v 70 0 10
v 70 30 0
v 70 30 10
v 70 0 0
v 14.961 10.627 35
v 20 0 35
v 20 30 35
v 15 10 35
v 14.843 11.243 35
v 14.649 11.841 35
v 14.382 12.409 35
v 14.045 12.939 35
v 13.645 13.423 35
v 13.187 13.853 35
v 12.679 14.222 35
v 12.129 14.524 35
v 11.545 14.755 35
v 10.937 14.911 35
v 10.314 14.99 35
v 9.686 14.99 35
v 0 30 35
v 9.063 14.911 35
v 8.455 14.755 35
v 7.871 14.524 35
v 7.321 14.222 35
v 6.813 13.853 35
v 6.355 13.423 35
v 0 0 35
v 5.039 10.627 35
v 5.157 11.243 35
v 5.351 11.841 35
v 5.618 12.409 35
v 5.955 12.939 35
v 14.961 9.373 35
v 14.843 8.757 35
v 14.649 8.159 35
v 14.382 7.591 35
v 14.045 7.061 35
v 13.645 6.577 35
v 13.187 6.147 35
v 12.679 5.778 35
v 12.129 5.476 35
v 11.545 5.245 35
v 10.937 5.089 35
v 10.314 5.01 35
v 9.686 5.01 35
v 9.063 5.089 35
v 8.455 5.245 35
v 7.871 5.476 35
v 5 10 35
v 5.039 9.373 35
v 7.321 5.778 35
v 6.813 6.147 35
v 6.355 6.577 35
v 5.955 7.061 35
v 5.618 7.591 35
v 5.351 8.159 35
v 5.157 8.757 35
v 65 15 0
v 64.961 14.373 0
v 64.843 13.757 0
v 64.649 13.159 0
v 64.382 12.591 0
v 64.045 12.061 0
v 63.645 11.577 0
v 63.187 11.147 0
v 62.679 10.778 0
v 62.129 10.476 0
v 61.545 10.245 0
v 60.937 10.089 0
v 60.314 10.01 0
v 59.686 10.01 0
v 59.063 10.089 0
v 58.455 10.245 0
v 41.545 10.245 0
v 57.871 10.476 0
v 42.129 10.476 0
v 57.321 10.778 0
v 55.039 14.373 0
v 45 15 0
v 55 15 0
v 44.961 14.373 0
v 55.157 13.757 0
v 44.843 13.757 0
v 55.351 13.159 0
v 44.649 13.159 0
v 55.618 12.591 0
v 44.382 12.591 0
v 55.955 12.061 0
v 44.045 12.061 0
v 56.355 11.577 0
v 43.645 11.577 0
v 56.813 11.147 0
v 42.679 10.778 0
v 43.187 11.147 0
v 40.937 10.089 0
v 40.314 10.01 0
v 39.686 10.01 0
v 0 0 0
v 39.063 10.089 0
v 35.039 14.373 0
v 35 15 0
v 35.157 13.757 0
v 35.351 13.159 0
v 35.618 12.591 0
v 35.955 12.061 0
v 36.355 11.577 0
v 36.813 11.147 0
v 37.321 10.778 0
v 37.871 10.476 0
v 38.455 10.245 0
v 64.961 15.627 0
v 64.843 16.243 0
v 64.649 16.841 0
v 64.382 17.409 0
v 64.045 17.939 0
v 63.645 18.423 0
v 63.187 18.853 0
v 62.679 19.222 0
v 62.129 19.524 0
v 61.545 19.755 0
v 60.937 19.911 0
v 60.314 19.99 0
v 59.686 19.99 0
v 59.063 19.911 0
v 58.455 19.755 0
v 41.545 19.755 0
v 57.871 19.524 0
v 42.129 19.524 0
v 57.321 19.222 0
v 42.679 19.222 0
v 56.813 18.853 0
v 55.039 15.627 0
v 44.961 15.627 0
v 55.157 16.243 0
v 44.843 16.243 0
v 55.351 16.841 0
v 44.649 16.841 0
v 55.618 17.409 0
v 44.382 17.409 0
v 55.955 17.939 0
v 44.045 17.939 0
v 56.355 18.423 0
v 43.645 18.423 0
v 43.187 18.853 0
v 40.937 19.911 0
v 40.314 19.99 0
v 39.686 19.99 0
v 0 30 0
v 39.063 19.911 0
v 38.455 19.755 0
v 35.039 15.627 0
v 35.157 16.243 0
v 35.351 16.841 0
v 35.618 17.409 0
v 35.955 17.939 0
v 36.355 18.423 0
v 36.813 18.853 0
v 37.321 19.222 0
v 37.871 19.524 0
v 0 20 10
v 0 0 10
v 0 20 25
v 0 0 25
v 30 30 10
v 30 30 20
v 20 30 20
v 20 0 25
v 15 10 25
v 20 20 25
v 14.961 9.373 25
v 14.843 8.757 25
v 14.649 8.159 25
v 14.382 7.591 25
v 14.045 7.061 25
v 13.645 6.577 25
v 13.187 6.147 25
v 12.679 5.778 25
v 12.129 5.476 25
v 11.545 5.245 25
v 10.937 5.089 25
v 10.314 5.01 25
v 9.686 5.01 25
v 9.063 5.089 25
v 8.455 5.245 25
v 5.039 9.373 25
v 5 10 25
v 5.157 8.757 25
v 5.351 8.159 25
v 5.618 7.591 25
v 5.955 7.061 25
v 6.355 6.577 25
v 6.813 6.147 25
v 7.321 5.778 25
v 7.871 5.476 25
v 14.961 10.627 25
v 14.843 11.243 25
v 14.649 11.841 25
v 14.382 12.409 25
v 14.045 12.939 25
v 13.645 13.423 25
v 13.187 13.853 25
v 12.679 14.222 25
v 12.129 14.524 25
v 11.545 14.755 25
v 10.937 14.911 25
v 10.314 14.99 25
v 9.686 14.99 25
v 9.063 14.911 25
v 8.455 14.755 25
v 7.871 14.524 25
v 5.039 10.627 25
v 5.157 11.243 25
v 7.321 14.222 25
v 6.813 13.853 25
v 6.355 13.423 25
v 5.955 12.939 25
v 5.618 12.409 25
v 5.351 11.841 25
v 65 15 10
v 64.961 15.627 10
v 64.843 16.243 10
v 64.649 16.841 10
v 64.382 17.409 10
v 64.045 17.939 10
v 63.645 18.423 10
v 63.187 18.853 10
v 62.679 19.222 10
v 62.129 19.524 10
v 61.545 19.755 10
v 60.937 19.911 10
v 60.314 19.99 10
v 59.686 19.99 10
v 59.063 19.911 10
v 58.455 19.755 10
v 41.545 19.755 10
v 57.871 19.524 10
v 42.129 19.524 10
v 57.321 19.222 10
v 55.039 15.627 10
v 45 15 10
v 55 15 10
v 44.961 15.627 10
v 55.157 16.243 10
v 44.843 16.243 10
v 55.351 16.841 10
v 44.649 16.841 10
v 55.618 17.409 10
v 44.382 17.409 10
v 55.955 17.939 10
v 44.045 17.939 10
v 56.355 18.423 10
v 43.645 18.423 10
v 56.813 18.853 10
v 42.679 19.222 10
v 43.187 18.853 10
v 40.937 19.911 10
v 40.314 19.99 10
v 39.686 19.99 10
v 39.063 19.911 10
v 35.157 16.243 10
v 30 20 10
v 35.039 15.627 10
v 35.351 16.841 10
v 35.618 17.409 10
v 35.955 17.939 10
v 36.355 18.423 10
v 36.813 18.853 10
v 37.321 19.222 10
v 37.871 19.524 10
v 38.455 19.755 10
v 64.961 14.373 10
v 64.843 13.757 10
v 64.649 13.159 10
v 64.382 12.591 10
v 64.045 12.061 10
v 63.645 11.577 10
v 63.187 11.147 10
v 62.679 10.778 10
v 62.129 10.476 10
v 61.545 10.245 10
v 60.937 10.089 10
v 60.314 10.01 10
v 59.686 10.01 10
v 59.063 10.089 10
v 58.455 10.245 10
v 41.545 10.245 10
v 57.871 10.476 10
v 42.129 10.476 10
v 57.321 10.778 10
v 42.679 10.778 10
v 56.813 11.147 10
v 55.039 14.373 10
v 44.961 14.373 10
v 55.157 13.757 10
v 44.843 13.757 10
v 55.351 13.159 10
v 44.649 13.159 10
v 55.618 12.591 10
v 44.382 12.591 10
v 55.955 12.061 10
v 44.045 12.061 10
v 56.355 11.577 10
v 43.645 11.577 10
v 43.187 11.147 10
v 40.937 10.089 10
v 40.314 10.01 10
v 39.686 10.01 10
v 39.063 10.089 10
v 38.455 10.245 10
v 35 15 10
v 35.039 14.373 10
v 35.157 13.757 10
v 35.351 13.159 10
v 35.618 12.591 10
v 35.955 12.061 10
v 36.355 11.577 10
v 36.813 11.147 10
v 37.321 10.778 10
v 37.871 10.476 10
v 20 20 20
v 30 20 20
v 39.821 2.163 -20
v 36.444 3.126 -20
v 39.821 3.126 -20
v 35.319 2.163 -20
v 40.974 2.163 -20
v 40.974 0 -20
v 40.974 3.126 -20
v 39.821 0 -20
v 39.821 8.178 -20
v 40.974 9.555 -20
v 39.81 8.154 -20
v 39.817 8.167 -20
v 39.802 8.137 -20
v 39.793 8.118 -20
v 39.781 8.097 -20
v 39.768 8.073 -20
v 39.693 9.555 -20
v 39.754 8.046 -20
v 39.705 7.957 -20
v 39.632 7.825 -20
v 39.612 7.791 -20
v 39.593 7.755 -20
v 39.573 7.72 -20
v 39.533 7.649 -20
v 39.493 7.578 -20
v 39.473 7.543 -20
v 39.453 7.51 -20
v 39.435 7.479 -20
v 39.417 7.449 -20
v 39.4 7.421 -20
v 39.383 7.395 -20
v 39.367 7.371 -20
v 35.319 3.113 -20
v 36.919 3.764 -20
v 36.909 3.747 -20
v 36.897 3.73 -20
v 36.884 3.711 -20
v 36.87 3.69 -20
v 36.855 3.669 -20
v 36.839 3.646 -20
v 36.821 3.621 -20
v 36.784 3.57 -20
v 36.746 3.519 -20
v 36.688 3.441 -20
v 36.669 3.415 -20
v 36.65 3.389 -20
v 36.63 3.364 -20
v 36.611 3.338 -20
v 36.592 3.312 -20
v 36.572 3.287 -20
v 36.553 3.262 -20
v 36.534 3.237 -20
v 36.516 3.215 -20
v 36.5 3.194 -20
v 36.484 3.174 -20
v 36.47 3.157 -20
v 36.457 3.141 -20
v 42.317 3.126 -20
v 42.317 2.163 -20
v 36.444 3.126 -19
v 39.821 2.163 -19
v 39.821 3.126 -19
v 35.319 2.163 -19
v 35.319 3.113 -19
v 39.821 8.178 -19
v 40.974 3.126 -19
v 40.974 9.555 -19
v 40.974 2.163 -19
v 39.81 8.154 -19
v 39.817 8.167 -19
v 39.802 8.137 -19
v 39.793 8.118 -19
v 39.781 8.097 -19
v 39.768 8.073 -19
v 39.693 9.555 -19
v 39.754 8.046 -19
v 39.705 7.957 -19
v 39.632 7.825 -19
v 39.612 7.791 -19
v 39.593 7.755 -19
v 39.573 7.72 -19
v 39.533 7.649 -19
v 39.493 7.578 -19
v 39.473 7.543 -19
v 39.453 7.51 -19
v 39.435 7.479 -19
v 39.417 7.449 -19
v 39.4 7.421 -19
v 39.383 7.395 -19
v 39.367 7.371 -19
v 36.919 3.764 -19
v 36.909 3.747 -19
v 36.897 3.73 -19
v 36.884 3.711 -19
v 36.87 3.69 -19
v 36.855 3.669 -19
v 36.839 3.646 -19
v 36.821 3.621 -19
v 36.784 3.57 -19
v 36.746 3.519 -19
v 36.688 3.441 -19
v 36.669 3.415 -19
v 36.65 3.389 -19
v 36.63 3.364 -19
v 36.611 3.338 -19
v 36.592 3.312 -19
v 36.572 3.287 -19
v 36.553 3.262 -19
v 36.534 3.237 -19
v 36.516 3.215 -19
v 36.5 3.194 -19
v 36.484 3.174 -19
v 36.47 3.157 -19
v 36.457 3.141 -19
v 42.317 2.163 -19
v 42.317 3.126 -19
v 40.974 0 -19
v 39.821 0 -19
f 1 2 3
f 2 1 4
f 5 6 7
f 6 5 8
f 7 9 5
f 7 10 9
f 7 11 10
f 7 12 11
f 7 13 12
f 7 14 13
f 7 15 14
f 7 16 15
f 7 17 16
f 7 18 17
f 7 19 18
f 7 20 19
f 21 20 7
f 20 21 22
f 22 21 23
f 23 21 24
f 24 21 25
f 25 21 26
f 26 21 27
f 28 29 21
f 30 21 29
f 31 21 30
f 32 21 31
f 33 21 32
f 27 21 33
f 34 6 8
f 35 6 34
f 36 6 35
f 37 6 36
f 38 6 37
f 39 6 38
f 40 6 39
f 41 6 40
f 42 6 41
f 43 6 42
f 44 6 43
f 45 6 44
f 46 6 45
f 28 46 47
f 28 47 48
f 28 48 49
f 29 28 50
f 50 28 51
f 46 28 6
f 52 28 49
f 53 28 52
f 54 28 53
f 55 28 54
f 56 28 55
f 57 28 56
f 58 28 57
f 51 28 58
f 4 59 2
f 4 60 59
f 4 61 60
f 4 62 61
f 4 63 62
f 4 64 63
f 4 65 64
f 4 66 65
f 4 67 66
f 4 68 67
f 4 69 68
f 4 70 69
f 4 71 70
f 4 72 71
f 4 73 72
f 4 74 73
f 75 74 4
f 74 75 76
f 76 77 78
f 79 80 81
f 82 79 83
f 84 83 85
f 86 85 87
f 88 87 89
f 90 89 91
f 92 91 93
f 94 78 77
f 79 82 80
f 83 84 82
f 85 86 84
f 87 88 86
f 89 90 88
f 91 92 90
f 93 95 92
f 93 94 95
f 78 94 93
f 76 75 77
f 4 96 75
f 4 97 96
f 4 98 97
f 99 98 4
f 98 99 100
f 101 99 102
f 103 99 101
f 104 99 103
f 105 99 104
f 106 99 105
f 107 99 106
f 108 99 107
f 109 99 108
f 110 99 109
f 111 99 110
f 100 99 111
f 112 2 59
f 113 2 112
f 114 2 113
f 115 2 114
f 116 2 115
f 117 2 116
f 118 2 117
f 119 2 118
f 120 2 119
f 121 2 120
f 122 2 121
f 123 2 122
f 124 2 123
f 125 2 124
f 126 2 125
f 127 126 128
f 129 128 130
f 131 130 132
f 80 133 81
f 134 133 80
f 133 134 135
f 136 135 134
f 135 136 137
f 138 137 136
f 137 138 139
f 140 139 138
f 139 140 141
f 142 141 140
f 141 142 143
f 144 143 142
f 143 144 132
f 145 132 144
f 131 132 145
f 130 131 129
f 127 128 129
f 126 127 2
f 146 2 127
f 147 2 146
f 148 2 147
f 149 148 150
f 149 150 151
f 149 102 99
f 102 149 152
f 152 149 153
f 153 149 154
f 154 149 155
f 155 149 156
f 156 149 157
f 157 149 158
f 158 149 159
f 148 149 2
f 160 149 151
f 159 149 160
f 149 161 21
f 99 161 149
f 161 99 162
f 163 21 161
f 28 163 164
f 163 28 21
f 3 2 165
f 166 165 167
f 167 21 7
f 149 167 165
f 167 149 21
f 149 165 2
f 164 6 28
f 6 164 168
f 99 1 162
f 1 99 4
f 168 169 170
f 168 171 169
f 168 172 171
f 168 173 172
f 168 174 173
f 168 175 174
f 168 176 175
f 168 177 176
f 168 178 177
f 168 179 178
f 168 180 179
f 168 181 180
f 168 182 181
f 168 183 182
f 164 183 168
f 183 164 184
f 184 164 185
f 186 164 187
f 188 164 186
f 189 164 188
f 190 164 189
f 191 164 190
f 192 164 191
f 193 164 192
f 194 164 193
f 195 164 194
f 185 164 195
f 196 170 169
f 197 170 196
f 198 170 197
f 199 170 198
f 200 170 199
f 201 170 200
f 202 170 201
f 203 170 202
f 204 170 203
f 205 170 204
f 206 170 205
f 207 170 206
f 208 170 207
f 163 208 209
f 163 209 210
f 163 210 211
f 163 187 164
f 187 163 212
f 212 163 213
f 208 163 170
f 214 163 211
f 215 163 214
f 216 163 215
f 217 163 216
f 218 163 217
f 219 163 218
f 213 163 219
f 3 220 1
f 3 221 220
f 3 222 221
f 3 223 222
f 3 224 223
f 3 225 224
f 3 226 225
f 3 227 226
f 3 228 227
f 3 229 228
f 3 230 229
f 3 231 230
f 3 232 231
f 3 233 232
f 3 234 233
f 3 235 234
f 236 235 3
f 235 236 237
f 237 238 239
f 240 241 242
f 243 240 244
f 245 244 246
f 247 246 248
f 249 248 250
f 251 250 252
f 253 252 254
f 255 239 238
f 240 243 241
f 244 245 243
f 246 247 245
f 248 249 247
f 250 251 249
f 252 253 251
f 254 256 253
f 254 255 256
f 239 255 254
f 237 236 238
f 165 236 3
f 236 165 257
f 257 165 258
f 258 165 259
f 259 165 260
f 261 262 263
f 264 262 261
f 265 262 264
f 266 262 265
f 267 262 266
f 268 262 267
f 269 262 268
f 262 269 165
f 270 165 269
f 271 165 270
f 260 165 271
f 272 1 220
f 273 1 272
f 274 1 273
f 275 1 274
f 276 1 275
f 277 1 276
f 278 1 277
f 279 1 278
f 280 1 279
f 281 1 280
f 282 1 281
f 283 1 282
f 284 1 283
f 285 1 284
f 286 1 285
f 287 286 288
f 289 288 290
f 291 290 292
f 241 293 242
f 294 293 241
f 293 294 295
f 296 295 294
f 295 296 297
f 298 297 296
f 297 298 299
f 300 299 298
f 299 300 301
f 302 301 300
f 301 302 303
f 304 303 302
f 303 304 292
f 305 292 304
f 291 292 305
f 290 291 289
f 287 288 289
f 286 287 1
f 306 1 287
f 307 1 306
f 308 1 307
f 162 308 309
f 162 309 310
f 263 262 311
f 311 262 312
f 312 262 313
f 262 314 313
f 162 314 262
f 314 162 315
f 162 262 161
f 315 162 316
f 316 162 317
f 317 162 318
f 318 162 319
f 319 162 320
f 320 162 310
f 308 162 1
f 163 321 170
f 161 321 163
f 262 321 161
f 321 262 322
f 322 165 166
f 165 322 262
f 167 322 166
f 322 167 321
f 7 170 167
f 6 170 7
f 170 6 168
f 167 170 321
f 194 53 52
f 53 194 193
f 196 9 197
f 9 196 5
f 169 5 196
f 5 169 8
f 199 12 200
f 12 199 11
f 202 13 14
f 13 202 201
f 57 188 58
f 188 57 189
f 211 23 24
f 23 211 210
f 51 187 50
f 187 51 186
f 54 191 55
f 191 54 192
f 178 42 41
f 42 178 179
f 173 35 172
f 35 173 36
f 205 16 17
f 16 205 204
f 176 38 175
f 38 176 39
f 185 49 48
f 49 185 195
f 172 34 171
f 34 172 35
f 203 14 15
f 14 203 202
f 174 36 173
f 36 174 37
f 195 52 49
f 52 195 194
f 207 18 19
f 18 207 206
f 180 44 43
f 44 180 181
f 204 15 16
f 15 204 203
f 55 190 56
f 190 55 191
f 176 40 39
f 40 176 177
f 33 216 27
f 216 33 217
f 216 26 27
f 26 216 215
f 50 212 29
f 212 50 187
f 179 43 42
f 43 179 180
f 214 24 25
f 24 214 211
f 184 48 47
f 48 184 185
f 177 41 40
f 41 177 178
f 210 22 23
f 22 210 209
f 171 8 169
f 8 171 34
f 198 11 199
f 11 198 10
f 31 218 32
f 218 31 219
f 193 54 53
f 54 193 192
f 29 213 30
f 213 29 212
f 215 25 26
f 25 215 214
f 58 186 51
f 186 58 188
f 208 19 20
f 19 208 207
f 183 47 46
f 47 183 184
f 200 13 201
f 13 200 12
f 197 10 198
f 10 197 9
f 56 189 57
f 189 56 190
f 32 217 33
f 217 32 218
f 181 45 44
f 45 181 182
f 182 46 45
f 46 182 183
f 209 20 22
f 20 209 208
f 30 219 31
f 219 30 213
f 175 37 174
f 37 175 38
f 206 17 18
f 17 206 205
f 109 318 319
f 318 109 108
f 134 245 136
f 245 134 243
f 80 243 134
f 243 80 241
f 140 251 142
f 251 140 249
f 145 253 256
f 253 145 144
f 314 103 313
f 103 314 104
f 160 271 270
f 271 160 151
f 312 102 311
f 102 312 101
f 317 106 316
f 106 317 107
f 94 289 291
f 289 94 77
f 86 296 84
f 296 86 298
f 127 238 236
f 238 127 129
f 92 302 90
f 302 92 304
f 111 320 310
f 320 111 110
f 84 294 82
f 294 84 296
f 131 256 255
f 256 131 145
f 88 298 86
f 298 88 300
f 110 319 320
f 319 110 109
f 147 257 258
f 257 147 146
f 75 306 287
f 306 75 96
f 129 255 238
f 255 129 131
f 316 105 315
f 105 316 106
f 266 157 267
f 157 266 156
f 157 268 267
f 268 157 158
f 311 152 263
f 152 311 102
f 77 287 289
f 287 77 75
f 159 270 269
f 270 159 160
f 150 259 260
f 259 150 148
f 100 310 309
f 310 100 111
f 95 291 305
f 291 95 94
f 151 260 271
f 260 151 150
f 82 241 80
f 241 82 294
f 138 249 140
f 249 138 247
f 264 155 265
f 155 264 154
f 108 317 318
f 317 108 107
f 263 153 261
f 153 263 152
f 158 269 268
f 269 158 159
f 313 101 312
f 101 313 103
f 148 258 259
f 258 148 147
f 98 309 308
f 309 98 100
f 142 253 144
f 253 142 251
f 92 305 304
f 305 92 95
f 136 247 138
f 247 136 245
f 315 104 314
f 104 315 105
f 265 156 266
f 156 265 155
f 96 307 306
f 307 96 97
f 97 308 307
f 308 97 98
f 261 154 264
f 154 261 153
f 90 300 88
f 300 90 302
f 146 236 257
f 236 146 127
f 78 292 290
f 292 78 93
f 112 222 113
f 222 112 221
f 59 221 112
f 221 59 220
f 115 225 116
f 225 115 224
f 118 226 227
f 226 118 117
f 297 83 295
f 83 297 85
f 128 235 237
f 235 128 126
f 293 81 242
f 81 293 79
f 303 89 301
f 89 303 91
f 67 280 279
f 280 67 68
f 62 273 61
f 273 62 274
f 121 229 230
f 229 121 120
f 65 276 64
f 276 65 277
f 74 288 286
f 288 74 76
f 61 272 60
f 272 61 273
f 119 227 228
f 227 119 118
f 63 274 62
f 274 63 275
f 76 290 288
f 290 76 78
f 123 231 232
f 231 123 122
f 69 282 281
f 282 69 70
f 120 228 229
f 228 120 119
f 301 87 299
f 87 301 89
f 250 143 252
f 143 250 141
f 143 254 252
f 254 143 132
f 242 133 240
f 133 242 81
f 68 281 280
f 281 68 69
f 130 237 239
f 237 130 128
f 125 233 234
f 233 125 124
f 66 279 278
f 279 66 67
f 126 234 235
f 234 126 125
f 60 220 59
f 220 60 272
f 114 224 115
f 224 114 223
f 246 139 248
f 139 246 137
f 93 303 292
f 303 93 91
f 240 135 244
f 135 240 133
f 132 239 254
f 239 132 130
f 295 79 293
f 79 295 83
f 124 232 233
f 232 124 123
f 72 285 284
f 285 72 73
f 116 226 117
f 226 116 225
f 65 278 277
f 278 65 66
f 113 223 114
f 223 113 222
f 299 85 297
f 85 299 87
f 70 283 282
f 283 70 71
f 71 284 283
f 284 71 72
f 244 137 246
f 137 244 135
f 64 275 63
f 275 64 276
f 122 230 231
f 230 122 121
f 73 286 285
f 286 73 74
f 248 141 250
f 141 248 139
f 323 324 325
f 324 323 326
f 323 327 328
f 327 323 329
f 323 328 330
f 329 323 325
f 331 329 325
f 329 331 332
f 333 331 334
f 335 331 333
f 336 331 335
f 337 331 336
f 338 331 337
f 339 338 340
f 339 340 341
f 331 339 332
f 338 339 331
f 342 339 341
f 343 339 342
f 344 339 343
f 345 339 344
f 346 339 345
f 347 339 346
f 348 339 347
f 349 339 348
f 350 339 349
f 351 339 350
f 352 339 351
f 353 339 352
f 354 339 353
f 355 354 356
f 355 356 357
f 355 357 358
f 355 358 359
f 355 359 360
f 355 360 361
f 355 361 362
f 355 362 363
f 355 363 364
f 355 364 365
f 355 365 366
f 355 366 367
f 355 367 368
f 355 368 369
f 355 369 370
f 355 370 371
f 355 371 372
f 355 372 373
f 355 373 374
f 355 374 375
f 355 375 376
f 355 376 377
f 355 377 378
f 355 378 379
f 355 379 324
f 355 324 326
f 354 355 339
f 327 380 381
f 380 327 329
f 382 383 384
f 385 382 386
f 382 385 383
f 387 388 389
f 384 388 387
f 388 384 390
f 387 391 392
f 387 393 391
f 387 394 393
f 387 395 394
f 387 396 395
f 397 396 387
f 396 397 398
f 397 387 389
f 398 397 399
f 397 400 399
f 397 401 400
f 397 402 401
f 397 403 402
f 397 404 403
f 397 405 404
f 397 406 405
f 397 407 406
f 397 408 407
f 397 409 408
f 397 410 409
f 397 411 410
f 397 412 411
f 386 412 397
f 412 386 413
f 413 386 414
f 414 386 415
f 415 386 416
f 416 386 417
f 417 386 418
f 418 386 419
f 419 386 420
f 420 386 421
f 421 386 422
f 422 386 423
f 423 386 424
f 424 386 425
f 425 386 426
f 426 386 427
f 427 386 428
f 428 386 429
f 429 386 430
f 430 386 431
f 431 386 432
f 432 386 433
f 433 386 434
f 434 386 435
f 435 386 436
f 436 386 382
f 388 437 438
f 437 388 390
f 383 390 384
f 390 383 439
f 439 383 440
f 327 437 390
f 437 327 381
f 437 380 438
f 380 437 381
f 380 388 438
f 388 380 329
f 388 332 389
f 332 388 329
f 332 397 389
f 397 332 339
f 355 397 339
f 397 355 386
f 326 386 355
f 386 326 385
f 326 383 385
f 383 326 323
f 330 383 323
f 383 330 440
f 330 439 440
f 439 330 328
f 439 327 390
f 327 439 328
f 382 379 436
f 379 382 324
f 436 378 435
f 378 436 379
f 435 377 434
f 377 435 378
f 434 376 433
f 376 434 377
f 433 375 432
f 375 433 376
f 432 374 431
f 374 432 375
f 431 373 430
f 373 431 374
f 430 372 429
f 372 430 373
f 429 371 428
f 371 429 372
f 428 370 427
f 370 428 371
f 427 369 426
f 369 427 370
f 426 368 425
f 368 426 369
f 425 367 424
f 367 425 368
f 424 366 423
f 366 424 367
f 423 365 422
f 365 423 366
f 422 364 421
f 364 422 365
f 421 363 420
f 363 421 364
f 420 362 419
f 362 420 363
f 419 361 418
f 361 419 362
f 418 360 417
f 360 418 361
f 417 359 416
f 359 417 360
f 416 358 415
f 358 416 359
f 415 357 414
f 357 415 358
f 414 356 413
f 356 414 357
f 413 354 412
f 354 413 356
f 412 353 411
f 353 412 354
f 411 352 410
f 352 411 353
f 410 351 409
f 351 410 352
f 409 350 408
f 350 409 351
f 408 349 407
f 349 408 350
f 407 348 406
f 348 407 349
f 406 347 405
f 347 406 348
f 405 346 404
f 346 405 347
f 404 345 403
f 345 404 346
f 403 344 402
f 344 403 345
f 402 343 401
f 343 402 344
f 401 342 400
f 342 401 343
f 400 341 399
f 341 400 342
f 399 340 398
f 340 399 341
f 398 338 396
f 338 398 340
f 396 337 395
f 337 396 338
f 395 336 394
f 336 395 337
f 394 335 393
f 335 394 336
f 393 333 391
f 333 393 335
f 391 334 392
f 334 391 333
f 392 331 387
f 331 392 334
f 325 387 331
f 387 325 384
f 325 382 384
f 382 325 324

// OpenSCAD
$fn=50;

cw=70;
cd=30;
ch=35;
cy=10;

difference() {
    cube([cw,cd,ch]);
    translate([0,0,10])
    cube([cw,20,15]);
    translate([cw-40,0,10])
    cube([cw,cd,15]);
    translate([20,0,20])
    cube([cw-20,cd,15]);
    translate([10,10,25])
    cylinder(h=cy,d=cy);
    translate([40,15,0])
    cylinder(h=cy,d=cy);
    translate([cw-10,15,0])
    cylinder(h=cy,d=cy);
}
translate([cw/2,0,-20])
linear_extrude(height=1)
text("4");
